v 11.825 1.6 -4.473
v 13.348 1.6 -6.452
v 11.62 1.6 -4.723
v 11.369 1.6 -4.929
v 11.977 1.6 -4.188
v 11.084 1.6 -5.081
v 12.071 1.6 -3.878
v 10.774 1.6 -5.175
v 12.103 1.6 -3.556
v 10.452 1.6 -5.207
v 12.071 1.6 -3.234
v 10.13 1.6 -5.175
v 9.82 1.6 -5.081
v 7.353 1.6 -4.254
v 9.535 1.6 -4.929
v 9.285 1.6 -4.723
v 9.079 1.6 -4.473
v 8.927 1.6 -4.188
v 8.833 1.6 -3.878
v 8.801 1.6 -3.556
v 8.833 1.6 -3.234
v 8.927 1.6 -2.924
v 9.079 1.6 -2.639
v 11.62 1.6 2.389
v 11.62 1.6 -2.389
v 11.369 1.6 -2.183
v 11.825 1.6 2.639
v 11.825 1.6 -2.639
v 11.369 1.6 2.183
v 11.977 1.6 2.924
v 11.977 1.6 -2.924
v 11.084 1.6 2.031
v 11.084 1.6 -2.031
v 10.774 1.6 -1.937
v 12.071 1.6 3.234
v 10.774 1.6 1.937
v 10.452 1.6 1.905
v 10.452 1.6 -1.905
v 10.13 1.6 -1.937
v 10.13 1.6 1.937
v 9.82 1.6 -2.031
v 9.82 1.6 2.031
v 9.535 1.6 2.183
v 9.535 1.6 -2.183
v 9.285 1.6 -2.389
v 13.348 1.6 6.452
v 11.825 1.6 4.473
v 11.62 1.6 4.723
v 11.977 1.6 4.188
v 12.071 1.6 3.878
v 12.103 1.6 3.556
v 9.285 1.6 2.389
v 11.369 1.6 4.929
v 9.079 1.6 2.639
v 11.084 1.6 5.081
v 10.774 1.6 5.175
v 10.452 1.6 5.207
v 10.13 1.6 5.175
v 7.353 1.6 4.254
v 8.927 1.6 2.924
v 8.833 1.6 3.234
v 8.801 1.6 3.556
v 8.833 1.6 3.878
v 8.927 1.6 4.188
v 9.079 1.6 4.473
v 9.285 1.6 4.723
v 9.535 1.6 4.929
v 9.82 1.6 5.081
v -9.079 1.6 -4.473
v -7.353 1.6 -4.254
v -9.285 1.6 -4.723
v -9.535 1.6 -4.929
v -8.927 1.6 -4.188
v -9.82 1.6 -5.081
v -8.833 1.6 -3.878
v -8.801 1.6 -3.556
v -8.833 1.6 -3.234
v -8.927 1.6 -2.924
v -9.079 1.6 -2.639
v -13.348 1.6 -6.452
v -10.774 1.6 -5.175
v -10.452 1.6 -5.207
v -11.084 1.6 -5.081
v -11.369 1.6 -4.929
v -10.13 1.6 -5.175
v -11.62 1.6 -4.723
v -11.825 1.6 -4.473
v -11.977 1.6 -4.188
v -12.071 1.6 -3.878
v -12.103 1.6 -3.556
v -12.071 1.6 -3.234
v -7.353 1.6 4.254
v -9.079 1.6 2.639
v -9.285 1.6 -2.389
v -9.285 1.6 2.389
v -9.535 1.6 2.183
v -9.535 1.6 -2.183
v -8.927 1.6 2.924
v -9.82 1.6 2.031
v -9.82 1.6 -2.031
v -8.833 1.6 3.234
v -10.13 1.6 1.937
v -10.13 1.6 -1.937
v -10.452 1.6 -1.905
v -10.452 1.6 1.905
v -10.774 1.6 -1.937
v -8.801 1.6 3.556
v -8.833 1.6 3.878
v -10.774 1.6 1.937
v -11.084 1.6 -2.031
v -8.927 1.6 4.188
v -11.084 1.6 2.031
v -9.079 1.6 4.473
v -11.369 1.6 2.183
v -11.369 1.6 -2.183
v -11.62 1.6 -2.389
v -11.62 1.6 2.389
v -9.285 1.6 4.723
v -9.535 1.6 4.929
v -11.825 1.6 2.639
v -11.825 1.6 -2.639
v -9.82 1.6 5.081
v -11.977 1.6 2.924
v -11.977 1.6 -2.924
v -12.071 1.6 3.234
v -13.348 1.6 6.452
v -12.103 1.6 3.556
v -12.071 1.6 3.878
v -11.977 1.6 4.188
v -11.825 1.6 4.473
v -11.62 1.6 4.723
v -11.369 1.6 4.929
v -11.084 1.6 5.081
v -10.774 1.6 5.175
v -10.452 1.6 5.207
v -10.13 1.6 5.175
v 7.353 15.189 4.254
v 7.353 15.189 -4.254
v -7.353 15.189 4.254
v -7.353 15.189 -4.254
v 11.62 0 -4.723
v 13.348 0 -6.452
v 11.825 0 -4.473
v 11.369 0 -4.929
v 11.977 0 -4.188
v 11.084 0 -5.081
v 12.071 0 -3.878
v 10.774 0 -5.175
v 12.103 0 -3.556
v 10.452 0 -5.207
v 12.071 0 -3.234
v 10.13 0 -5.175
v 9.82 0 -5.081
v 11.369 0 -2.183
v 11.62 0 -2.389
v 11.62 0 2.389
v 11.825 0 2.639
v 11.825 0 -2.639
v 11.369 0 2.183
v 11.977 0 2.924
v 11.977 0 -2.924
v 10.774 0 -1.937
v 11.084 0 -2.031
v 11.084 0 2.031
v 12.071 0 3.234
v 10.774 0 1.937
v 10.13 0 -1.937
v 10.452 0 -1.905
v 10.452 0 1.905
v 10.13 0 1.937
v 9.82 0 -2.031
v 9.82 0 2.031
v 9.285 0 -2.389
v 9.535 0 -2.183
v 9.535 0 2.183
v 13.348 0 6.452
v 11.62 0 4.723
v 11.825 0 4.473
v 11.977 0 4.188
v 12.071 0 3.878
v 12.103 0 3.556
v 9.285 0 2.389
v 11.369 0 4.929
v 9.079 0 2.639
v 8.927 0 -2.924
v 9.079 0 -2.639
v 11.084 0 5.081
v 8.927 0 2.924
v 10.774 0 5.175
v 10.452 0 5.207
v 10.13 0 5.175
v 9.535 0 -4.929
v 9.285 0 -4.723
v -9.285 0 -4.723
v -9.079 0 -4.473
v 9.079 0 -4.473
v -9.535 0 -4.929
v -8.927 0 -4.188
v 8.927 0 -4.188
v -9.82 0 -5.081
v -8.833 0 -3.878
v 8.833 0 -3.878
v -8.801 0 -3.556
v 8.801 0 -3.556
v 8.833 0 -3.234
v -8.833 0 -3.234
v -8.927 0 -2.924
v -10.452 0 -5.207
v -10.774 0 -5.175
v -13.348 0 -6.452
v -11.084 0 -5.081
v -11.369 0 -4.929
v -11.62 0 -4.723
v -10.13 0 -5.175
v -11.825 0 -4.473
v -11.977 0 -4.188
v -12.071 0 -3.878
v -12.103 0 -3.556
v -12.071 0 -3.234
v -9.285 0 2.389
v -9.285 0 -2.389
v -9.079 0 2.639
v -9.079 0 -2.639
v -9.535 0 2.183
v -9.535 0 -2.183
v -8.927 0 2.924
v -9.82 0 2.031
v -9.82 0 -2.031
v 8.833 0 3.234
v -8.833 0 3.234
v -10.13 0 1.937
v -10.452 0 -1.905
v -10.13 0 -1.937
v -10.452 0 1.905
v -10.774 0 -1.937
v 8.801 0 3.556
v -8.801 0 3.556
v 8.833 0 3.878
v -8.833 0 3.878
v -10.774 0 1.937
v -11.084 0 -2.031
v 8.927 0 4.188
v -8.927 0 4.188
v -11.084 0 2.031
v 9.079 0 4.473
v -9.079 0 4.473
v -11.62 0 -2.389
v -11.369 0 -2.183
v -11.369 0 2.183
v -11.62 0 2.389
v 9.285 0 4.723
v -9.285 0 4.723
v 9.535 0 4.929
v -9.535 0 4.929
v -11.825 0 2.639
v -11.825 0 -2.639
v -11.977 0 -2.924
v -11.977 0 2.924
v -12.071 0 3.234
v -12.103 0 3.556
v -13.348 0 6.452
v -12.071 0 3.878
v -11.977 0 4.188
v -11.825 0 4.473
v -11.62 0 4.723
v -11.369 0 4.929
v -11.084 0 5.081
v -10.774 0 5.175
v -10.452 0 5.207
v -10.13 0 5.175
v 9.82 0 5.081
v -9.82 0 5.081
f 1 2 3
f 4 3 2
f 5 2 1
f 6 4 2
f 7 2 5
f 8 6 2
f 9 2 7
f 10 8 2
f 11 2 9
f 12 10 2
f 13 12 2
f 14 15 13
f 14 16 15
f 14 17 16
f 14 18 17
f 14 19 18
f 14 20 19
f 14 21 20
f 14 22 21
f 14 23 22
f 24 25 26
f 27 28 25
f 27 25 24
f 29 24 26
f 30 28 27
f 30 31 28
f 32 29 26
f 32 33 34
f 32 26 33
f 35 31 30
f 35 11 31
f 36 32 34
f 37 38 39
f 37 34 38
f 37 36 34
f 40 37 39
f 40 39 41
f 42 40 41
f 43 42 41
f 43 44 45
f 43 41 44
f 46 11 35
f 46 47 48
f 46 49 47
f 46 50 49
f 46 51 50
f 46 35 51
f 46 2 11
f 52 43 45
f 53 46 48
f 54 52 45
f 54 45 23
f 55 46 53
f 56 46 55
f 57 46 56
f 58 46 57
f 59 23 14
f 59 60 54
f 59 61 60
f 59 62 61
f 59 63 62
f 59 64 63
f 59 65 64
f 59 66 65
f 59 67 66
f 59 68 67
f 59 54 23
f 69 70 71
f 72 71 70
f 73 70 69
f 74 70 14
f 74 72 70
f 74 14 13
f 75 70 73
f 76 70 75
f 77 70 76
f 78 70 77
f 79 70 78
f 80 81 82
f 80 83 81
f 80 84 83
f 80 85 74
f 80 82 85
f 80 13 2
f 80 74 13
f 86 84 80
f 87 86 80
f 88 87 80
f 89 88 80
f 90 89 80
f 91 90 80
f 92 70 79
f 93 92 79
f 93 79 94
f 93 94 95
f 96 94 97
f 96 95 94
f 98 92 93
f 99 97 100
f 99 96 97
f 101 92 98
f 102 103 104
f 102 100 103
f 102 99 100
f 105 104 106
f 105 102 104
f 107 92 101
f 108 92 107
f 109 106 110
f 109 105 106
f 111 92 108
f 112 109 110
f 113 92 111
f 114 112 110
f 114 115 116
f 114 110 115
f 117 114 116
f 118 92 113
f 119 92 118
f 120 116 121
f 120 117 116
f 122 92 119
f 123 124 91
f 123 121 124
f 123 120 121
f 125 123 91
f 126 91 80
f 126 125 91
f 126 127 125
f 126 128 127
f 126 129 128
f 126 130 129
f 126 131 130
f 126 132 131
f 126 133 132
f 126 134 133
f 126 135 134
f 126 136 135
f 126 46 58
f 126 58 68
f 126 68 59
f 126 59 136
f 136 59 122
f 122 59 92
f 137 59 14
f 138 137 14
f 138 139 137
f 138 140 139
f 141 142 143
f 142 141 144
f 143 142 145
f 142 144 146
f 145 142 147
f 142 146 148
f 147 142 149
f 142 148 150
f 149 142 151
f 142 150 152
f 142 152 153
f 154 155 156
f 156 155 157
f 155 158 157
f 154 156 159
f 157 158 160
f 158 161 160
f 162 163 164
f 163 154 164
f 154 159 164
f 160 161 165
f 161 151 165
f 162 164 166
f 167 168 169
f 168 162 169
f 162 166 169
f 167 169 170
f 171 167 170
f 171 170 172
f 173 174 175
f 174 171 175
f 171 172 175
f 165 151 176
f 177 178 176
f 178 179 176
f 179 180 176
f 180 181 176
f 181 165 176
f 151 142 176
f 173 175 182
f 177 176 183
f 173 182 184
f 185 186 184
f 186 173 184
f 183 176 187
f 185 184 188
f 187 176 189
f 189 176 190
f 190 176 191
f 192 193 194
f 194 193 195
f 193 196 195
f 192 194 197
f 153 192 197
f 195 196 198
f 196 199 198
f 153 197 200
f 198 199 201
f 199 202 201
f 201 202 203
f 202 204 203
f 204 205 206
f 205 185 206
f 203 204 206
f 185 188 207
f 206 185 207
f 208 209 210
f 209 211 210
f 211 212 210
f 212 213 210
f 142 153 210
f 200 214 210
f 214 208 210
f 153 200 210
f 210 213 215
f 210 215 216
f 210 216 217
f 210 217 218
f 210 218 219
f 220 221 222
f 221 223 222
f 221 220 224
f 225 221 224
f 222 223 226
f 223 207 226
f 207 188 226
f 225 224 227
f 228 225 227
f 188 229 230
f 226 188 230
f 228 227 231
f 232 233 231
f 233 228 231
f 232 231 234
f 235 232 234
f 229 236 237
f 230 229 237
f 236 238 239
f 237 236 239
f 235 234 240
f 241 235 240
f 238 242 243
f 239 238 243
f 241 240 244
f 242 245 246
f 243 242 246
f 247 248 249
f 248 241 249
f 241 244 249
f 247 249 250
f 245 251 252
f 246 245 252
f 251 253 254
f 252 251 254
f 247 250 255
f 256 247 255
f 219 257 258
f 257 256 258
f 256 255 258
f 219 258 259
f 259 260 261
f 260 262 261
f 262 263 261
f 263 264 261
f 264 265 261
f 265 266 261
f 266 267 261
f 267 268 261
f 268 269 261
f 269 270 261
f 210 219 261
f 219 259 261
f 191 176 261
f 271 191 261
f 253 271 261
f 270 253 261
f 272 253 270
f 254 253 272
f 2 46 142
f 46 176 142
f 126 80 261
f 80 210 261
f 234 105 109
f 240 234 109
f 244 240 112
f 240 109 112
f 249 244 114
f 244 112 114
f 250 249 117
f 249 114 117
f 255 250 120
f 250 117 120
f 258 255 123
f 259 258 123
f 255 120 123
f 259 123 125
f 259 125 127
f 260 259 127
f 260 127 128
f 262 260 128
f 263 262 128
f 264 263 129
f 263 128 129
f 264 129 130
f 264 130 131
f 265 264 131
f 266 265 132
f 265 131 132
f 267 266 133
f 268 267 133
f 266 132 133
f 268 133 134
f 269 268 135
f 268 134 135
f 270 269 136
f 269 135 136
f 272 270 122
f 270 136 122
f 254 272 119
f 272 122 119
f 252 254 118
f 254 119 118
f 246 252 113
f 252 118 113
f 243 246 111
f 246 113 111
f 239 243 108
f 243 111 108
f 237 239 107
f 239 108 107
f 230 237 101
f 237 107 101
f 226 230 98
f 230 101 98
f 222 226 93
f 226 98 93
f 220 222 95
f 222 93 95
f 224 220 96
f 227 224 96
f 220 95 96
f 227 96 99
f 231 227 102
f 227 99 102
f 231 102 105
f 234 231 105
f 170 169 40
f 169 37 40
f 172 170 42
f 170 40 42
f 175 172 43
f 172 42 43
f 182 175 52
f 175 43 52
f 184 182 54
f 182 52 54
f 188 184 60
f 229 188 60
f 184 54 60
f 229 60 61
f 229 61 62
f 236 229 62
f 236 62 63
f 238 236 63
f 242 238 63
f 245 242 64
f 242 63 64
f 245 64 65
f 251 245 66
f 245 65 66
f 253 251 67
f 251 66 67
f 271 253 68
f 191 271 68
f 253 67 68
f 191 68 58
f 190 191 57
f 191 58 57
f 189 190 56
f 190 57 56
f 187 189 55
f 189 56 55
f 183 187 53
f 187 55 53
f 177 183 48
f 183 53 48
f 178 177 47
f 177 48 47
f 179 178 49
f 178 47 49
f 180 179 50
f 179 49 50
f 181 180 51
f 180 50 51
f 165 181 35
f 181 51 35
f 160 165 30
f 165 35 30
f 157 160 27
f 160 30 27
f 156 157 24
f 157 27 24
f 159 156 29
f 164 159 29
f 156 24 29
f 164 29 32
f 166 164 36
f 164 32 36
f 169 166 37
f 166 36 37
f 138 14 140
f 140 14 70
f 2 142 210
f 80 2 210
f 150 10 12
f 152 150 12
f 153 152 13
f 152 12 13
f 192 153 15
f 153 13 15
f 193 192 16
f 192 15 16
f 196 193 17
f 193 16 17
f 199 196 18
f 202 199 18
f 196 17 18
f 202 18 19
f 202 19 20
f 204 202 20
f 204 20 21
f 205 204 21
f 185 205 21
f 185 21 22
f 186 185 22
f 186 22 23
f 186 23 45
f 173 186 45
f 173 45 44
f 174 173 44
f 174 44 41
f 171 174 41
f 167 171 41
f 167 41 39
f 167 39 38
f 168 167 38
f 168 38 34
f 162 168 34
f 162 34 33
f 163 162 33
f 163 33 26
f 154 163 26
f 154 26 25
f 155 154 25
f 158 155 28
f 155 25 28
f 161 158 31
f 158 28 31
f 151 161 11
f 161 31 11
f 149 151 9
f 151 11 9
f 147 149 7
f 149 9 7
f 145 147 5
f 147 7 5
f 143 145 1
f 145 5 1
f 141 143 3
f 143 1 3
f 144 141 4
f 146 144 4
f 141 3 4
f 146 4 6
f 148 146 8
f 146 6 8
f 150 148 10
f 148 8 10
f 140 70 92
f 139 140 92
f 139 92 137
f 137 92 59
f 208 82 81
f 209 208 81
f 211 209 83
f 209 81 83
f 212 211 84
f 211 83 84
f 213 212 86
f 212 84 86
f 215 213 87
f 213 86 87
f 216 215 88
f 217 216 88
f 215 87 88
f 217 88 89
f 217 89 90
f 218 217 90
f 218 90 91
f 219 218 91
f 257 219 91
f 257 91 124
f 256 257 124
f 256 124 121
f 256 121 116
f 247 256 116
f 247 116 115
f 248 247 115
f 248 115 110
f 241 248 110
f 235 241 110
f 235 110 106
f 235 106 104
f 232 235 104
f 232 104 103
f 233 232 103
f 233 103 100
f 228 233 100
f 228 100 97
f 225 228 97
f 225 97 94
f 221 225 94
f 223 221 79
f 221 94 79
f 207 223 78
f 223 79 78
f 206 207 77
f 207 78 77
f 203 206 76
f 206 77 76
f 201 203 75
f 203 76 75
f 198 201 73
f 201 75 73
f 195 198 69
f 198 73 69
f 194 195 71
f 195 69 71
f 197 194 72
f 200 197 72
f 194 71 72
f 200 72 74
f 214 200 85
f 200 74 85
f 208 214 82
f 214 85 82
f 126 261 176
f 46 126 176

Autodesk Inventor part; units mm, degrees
ref_plane "YZ Plane" through (0, 0, 0) normal (1, 0, 0) x (0, 1, 0)
ref_plane "XZ Plane" through (0, 0, 0) normal (0, 1, 0) x (-1, 0, 0)
ref_plane "XY Plane" through (0, 0, 0) normal (0, 0, 1) x (1, 0, 0)
sketch "Sketch5" plane through (0, 0, 0) normal (0, 1, 0) x (-1, 0, 0)
  line L0 (13.3477, 6.4516) -> (-13.3477, 6.4516)
  line L1 (-13.3477, 6.4516) -> (-13.3477, -6.4516)
  line L2 (-13.3477, -6.4516) -> (13.3477, -6.4516)
  line L3 (13.3477, -6.4516) -> (13.3477, 6.4516)
  line L4 (13.3477, 6.4516) -> (-13.3477, -6.4516) construction
  line L5 (-13.3477, 6.4516) -> (13.3477, -6.4516) construction
  point P0 (0, 0)
  dimension "d25" = 26.6954
  dimension "d26" = 12.9032
extrude "Extrusion3" add sketch "Sketch5" along normal blind 1.6002
sketch "Sketch6" plane through (0, 1.6002, 0) normal (0, 1, 0) x (1, 0, 0)
  line L0 (-7.3533, -4.2545) -> (7.3533, -4.2545)
  line L1 (7.3533, -4.2545) -> (7.3533, 4.2545)
  line L2 (7.3533, 4.2545) -> (-7.3533, 4.2545)
  line L3 (-7.3533, 4.2545) -> (-7.3533, -4.2545)
  line L4 (-7.3533, -4.2545) -> (7.3533, 4.2545) construction
  line L5 (7.3533, -4.2545) -> (-7.3533, 4.2545) construction
  point P0 (0, 0)
  dimension "d29" = 14.7066
  dimension "d30" = 8.509
extrude "Extrusion4" add sketch "Sketch6" along normal blind 13.589
sketch "Sketch7" plane through (0, 0, 0) normal (0, -1, 0) x (1, 0, 0)
  line L0 (-10.4521, -3.556) -> (10.4521, -3.556) construction
  line L1 (10.4521, -3.556) -> (10.4521, 3.556) construction
  line L2 (10.4521, 3.556) -> (-10.4521, 3.556) construction
  line L3 (-10.4521, 3.556) -> (-10.4521, -3.556) construction
  line L4 (-10.4521, -3.556) -> (10.4521, 3.556) construction
  line L5 (10.4521, -3.556) -> (-10.4521, 3.556) construction
  point P0 (0, 0)
  dimension "d33" = 20.9042
  dimension "d34" = 7.112
hole "Hole3" at (-10.4521, 0, 3.556) at (10.4521, 0, 3.556) at (10.4521, 0, -3.556) at (-10.4521, 0, -3.556) direction (0, 1, 0) diameter 3.302 end through all
equation "\"d25\" = CanBaseWidth"
equation "\"d26\" = CanBaseLength"
equation "\"d27\" = pcBoardDepth"
equation "\"d29\" = connectorWidth"
equation "\"d30\" = connectorLength"
equation "\"d31\" = connectorHeight"
equation "\"d33\" = HoleWidth"
equation "\"d34\" = HoleLength"
equation "\"CanBaseWidth\" = 26.6954"
equation "\"CanBaseLength\" = 12.9032"
equation "\"HoleWidth\" = 20.9042"
equation "\"HoleLength\" = 7.112"
equation "\"BaseOffset\" = 5.08"
equation "\"PartWidth\" = CanBaseWidth + 2 * BaseOffset"
equation "\"PartLength\" = CanBaseLength + 2 * BaseOffset"
equation "\"boardGap\" = 0.508"
equation "\"boltHeadHeight\" = 3.175"
equation "\"boltHeadDiam\" = 5.08"
equation "\"pcBoardDepth\" = 1.6002"
equation "\"connectorWidth\" = 14.7066"
equation "\"connectorLength\" = 8.509"
equation "\"connectorHeight\" = 13.589"
properties part number "canConnectorModel"
